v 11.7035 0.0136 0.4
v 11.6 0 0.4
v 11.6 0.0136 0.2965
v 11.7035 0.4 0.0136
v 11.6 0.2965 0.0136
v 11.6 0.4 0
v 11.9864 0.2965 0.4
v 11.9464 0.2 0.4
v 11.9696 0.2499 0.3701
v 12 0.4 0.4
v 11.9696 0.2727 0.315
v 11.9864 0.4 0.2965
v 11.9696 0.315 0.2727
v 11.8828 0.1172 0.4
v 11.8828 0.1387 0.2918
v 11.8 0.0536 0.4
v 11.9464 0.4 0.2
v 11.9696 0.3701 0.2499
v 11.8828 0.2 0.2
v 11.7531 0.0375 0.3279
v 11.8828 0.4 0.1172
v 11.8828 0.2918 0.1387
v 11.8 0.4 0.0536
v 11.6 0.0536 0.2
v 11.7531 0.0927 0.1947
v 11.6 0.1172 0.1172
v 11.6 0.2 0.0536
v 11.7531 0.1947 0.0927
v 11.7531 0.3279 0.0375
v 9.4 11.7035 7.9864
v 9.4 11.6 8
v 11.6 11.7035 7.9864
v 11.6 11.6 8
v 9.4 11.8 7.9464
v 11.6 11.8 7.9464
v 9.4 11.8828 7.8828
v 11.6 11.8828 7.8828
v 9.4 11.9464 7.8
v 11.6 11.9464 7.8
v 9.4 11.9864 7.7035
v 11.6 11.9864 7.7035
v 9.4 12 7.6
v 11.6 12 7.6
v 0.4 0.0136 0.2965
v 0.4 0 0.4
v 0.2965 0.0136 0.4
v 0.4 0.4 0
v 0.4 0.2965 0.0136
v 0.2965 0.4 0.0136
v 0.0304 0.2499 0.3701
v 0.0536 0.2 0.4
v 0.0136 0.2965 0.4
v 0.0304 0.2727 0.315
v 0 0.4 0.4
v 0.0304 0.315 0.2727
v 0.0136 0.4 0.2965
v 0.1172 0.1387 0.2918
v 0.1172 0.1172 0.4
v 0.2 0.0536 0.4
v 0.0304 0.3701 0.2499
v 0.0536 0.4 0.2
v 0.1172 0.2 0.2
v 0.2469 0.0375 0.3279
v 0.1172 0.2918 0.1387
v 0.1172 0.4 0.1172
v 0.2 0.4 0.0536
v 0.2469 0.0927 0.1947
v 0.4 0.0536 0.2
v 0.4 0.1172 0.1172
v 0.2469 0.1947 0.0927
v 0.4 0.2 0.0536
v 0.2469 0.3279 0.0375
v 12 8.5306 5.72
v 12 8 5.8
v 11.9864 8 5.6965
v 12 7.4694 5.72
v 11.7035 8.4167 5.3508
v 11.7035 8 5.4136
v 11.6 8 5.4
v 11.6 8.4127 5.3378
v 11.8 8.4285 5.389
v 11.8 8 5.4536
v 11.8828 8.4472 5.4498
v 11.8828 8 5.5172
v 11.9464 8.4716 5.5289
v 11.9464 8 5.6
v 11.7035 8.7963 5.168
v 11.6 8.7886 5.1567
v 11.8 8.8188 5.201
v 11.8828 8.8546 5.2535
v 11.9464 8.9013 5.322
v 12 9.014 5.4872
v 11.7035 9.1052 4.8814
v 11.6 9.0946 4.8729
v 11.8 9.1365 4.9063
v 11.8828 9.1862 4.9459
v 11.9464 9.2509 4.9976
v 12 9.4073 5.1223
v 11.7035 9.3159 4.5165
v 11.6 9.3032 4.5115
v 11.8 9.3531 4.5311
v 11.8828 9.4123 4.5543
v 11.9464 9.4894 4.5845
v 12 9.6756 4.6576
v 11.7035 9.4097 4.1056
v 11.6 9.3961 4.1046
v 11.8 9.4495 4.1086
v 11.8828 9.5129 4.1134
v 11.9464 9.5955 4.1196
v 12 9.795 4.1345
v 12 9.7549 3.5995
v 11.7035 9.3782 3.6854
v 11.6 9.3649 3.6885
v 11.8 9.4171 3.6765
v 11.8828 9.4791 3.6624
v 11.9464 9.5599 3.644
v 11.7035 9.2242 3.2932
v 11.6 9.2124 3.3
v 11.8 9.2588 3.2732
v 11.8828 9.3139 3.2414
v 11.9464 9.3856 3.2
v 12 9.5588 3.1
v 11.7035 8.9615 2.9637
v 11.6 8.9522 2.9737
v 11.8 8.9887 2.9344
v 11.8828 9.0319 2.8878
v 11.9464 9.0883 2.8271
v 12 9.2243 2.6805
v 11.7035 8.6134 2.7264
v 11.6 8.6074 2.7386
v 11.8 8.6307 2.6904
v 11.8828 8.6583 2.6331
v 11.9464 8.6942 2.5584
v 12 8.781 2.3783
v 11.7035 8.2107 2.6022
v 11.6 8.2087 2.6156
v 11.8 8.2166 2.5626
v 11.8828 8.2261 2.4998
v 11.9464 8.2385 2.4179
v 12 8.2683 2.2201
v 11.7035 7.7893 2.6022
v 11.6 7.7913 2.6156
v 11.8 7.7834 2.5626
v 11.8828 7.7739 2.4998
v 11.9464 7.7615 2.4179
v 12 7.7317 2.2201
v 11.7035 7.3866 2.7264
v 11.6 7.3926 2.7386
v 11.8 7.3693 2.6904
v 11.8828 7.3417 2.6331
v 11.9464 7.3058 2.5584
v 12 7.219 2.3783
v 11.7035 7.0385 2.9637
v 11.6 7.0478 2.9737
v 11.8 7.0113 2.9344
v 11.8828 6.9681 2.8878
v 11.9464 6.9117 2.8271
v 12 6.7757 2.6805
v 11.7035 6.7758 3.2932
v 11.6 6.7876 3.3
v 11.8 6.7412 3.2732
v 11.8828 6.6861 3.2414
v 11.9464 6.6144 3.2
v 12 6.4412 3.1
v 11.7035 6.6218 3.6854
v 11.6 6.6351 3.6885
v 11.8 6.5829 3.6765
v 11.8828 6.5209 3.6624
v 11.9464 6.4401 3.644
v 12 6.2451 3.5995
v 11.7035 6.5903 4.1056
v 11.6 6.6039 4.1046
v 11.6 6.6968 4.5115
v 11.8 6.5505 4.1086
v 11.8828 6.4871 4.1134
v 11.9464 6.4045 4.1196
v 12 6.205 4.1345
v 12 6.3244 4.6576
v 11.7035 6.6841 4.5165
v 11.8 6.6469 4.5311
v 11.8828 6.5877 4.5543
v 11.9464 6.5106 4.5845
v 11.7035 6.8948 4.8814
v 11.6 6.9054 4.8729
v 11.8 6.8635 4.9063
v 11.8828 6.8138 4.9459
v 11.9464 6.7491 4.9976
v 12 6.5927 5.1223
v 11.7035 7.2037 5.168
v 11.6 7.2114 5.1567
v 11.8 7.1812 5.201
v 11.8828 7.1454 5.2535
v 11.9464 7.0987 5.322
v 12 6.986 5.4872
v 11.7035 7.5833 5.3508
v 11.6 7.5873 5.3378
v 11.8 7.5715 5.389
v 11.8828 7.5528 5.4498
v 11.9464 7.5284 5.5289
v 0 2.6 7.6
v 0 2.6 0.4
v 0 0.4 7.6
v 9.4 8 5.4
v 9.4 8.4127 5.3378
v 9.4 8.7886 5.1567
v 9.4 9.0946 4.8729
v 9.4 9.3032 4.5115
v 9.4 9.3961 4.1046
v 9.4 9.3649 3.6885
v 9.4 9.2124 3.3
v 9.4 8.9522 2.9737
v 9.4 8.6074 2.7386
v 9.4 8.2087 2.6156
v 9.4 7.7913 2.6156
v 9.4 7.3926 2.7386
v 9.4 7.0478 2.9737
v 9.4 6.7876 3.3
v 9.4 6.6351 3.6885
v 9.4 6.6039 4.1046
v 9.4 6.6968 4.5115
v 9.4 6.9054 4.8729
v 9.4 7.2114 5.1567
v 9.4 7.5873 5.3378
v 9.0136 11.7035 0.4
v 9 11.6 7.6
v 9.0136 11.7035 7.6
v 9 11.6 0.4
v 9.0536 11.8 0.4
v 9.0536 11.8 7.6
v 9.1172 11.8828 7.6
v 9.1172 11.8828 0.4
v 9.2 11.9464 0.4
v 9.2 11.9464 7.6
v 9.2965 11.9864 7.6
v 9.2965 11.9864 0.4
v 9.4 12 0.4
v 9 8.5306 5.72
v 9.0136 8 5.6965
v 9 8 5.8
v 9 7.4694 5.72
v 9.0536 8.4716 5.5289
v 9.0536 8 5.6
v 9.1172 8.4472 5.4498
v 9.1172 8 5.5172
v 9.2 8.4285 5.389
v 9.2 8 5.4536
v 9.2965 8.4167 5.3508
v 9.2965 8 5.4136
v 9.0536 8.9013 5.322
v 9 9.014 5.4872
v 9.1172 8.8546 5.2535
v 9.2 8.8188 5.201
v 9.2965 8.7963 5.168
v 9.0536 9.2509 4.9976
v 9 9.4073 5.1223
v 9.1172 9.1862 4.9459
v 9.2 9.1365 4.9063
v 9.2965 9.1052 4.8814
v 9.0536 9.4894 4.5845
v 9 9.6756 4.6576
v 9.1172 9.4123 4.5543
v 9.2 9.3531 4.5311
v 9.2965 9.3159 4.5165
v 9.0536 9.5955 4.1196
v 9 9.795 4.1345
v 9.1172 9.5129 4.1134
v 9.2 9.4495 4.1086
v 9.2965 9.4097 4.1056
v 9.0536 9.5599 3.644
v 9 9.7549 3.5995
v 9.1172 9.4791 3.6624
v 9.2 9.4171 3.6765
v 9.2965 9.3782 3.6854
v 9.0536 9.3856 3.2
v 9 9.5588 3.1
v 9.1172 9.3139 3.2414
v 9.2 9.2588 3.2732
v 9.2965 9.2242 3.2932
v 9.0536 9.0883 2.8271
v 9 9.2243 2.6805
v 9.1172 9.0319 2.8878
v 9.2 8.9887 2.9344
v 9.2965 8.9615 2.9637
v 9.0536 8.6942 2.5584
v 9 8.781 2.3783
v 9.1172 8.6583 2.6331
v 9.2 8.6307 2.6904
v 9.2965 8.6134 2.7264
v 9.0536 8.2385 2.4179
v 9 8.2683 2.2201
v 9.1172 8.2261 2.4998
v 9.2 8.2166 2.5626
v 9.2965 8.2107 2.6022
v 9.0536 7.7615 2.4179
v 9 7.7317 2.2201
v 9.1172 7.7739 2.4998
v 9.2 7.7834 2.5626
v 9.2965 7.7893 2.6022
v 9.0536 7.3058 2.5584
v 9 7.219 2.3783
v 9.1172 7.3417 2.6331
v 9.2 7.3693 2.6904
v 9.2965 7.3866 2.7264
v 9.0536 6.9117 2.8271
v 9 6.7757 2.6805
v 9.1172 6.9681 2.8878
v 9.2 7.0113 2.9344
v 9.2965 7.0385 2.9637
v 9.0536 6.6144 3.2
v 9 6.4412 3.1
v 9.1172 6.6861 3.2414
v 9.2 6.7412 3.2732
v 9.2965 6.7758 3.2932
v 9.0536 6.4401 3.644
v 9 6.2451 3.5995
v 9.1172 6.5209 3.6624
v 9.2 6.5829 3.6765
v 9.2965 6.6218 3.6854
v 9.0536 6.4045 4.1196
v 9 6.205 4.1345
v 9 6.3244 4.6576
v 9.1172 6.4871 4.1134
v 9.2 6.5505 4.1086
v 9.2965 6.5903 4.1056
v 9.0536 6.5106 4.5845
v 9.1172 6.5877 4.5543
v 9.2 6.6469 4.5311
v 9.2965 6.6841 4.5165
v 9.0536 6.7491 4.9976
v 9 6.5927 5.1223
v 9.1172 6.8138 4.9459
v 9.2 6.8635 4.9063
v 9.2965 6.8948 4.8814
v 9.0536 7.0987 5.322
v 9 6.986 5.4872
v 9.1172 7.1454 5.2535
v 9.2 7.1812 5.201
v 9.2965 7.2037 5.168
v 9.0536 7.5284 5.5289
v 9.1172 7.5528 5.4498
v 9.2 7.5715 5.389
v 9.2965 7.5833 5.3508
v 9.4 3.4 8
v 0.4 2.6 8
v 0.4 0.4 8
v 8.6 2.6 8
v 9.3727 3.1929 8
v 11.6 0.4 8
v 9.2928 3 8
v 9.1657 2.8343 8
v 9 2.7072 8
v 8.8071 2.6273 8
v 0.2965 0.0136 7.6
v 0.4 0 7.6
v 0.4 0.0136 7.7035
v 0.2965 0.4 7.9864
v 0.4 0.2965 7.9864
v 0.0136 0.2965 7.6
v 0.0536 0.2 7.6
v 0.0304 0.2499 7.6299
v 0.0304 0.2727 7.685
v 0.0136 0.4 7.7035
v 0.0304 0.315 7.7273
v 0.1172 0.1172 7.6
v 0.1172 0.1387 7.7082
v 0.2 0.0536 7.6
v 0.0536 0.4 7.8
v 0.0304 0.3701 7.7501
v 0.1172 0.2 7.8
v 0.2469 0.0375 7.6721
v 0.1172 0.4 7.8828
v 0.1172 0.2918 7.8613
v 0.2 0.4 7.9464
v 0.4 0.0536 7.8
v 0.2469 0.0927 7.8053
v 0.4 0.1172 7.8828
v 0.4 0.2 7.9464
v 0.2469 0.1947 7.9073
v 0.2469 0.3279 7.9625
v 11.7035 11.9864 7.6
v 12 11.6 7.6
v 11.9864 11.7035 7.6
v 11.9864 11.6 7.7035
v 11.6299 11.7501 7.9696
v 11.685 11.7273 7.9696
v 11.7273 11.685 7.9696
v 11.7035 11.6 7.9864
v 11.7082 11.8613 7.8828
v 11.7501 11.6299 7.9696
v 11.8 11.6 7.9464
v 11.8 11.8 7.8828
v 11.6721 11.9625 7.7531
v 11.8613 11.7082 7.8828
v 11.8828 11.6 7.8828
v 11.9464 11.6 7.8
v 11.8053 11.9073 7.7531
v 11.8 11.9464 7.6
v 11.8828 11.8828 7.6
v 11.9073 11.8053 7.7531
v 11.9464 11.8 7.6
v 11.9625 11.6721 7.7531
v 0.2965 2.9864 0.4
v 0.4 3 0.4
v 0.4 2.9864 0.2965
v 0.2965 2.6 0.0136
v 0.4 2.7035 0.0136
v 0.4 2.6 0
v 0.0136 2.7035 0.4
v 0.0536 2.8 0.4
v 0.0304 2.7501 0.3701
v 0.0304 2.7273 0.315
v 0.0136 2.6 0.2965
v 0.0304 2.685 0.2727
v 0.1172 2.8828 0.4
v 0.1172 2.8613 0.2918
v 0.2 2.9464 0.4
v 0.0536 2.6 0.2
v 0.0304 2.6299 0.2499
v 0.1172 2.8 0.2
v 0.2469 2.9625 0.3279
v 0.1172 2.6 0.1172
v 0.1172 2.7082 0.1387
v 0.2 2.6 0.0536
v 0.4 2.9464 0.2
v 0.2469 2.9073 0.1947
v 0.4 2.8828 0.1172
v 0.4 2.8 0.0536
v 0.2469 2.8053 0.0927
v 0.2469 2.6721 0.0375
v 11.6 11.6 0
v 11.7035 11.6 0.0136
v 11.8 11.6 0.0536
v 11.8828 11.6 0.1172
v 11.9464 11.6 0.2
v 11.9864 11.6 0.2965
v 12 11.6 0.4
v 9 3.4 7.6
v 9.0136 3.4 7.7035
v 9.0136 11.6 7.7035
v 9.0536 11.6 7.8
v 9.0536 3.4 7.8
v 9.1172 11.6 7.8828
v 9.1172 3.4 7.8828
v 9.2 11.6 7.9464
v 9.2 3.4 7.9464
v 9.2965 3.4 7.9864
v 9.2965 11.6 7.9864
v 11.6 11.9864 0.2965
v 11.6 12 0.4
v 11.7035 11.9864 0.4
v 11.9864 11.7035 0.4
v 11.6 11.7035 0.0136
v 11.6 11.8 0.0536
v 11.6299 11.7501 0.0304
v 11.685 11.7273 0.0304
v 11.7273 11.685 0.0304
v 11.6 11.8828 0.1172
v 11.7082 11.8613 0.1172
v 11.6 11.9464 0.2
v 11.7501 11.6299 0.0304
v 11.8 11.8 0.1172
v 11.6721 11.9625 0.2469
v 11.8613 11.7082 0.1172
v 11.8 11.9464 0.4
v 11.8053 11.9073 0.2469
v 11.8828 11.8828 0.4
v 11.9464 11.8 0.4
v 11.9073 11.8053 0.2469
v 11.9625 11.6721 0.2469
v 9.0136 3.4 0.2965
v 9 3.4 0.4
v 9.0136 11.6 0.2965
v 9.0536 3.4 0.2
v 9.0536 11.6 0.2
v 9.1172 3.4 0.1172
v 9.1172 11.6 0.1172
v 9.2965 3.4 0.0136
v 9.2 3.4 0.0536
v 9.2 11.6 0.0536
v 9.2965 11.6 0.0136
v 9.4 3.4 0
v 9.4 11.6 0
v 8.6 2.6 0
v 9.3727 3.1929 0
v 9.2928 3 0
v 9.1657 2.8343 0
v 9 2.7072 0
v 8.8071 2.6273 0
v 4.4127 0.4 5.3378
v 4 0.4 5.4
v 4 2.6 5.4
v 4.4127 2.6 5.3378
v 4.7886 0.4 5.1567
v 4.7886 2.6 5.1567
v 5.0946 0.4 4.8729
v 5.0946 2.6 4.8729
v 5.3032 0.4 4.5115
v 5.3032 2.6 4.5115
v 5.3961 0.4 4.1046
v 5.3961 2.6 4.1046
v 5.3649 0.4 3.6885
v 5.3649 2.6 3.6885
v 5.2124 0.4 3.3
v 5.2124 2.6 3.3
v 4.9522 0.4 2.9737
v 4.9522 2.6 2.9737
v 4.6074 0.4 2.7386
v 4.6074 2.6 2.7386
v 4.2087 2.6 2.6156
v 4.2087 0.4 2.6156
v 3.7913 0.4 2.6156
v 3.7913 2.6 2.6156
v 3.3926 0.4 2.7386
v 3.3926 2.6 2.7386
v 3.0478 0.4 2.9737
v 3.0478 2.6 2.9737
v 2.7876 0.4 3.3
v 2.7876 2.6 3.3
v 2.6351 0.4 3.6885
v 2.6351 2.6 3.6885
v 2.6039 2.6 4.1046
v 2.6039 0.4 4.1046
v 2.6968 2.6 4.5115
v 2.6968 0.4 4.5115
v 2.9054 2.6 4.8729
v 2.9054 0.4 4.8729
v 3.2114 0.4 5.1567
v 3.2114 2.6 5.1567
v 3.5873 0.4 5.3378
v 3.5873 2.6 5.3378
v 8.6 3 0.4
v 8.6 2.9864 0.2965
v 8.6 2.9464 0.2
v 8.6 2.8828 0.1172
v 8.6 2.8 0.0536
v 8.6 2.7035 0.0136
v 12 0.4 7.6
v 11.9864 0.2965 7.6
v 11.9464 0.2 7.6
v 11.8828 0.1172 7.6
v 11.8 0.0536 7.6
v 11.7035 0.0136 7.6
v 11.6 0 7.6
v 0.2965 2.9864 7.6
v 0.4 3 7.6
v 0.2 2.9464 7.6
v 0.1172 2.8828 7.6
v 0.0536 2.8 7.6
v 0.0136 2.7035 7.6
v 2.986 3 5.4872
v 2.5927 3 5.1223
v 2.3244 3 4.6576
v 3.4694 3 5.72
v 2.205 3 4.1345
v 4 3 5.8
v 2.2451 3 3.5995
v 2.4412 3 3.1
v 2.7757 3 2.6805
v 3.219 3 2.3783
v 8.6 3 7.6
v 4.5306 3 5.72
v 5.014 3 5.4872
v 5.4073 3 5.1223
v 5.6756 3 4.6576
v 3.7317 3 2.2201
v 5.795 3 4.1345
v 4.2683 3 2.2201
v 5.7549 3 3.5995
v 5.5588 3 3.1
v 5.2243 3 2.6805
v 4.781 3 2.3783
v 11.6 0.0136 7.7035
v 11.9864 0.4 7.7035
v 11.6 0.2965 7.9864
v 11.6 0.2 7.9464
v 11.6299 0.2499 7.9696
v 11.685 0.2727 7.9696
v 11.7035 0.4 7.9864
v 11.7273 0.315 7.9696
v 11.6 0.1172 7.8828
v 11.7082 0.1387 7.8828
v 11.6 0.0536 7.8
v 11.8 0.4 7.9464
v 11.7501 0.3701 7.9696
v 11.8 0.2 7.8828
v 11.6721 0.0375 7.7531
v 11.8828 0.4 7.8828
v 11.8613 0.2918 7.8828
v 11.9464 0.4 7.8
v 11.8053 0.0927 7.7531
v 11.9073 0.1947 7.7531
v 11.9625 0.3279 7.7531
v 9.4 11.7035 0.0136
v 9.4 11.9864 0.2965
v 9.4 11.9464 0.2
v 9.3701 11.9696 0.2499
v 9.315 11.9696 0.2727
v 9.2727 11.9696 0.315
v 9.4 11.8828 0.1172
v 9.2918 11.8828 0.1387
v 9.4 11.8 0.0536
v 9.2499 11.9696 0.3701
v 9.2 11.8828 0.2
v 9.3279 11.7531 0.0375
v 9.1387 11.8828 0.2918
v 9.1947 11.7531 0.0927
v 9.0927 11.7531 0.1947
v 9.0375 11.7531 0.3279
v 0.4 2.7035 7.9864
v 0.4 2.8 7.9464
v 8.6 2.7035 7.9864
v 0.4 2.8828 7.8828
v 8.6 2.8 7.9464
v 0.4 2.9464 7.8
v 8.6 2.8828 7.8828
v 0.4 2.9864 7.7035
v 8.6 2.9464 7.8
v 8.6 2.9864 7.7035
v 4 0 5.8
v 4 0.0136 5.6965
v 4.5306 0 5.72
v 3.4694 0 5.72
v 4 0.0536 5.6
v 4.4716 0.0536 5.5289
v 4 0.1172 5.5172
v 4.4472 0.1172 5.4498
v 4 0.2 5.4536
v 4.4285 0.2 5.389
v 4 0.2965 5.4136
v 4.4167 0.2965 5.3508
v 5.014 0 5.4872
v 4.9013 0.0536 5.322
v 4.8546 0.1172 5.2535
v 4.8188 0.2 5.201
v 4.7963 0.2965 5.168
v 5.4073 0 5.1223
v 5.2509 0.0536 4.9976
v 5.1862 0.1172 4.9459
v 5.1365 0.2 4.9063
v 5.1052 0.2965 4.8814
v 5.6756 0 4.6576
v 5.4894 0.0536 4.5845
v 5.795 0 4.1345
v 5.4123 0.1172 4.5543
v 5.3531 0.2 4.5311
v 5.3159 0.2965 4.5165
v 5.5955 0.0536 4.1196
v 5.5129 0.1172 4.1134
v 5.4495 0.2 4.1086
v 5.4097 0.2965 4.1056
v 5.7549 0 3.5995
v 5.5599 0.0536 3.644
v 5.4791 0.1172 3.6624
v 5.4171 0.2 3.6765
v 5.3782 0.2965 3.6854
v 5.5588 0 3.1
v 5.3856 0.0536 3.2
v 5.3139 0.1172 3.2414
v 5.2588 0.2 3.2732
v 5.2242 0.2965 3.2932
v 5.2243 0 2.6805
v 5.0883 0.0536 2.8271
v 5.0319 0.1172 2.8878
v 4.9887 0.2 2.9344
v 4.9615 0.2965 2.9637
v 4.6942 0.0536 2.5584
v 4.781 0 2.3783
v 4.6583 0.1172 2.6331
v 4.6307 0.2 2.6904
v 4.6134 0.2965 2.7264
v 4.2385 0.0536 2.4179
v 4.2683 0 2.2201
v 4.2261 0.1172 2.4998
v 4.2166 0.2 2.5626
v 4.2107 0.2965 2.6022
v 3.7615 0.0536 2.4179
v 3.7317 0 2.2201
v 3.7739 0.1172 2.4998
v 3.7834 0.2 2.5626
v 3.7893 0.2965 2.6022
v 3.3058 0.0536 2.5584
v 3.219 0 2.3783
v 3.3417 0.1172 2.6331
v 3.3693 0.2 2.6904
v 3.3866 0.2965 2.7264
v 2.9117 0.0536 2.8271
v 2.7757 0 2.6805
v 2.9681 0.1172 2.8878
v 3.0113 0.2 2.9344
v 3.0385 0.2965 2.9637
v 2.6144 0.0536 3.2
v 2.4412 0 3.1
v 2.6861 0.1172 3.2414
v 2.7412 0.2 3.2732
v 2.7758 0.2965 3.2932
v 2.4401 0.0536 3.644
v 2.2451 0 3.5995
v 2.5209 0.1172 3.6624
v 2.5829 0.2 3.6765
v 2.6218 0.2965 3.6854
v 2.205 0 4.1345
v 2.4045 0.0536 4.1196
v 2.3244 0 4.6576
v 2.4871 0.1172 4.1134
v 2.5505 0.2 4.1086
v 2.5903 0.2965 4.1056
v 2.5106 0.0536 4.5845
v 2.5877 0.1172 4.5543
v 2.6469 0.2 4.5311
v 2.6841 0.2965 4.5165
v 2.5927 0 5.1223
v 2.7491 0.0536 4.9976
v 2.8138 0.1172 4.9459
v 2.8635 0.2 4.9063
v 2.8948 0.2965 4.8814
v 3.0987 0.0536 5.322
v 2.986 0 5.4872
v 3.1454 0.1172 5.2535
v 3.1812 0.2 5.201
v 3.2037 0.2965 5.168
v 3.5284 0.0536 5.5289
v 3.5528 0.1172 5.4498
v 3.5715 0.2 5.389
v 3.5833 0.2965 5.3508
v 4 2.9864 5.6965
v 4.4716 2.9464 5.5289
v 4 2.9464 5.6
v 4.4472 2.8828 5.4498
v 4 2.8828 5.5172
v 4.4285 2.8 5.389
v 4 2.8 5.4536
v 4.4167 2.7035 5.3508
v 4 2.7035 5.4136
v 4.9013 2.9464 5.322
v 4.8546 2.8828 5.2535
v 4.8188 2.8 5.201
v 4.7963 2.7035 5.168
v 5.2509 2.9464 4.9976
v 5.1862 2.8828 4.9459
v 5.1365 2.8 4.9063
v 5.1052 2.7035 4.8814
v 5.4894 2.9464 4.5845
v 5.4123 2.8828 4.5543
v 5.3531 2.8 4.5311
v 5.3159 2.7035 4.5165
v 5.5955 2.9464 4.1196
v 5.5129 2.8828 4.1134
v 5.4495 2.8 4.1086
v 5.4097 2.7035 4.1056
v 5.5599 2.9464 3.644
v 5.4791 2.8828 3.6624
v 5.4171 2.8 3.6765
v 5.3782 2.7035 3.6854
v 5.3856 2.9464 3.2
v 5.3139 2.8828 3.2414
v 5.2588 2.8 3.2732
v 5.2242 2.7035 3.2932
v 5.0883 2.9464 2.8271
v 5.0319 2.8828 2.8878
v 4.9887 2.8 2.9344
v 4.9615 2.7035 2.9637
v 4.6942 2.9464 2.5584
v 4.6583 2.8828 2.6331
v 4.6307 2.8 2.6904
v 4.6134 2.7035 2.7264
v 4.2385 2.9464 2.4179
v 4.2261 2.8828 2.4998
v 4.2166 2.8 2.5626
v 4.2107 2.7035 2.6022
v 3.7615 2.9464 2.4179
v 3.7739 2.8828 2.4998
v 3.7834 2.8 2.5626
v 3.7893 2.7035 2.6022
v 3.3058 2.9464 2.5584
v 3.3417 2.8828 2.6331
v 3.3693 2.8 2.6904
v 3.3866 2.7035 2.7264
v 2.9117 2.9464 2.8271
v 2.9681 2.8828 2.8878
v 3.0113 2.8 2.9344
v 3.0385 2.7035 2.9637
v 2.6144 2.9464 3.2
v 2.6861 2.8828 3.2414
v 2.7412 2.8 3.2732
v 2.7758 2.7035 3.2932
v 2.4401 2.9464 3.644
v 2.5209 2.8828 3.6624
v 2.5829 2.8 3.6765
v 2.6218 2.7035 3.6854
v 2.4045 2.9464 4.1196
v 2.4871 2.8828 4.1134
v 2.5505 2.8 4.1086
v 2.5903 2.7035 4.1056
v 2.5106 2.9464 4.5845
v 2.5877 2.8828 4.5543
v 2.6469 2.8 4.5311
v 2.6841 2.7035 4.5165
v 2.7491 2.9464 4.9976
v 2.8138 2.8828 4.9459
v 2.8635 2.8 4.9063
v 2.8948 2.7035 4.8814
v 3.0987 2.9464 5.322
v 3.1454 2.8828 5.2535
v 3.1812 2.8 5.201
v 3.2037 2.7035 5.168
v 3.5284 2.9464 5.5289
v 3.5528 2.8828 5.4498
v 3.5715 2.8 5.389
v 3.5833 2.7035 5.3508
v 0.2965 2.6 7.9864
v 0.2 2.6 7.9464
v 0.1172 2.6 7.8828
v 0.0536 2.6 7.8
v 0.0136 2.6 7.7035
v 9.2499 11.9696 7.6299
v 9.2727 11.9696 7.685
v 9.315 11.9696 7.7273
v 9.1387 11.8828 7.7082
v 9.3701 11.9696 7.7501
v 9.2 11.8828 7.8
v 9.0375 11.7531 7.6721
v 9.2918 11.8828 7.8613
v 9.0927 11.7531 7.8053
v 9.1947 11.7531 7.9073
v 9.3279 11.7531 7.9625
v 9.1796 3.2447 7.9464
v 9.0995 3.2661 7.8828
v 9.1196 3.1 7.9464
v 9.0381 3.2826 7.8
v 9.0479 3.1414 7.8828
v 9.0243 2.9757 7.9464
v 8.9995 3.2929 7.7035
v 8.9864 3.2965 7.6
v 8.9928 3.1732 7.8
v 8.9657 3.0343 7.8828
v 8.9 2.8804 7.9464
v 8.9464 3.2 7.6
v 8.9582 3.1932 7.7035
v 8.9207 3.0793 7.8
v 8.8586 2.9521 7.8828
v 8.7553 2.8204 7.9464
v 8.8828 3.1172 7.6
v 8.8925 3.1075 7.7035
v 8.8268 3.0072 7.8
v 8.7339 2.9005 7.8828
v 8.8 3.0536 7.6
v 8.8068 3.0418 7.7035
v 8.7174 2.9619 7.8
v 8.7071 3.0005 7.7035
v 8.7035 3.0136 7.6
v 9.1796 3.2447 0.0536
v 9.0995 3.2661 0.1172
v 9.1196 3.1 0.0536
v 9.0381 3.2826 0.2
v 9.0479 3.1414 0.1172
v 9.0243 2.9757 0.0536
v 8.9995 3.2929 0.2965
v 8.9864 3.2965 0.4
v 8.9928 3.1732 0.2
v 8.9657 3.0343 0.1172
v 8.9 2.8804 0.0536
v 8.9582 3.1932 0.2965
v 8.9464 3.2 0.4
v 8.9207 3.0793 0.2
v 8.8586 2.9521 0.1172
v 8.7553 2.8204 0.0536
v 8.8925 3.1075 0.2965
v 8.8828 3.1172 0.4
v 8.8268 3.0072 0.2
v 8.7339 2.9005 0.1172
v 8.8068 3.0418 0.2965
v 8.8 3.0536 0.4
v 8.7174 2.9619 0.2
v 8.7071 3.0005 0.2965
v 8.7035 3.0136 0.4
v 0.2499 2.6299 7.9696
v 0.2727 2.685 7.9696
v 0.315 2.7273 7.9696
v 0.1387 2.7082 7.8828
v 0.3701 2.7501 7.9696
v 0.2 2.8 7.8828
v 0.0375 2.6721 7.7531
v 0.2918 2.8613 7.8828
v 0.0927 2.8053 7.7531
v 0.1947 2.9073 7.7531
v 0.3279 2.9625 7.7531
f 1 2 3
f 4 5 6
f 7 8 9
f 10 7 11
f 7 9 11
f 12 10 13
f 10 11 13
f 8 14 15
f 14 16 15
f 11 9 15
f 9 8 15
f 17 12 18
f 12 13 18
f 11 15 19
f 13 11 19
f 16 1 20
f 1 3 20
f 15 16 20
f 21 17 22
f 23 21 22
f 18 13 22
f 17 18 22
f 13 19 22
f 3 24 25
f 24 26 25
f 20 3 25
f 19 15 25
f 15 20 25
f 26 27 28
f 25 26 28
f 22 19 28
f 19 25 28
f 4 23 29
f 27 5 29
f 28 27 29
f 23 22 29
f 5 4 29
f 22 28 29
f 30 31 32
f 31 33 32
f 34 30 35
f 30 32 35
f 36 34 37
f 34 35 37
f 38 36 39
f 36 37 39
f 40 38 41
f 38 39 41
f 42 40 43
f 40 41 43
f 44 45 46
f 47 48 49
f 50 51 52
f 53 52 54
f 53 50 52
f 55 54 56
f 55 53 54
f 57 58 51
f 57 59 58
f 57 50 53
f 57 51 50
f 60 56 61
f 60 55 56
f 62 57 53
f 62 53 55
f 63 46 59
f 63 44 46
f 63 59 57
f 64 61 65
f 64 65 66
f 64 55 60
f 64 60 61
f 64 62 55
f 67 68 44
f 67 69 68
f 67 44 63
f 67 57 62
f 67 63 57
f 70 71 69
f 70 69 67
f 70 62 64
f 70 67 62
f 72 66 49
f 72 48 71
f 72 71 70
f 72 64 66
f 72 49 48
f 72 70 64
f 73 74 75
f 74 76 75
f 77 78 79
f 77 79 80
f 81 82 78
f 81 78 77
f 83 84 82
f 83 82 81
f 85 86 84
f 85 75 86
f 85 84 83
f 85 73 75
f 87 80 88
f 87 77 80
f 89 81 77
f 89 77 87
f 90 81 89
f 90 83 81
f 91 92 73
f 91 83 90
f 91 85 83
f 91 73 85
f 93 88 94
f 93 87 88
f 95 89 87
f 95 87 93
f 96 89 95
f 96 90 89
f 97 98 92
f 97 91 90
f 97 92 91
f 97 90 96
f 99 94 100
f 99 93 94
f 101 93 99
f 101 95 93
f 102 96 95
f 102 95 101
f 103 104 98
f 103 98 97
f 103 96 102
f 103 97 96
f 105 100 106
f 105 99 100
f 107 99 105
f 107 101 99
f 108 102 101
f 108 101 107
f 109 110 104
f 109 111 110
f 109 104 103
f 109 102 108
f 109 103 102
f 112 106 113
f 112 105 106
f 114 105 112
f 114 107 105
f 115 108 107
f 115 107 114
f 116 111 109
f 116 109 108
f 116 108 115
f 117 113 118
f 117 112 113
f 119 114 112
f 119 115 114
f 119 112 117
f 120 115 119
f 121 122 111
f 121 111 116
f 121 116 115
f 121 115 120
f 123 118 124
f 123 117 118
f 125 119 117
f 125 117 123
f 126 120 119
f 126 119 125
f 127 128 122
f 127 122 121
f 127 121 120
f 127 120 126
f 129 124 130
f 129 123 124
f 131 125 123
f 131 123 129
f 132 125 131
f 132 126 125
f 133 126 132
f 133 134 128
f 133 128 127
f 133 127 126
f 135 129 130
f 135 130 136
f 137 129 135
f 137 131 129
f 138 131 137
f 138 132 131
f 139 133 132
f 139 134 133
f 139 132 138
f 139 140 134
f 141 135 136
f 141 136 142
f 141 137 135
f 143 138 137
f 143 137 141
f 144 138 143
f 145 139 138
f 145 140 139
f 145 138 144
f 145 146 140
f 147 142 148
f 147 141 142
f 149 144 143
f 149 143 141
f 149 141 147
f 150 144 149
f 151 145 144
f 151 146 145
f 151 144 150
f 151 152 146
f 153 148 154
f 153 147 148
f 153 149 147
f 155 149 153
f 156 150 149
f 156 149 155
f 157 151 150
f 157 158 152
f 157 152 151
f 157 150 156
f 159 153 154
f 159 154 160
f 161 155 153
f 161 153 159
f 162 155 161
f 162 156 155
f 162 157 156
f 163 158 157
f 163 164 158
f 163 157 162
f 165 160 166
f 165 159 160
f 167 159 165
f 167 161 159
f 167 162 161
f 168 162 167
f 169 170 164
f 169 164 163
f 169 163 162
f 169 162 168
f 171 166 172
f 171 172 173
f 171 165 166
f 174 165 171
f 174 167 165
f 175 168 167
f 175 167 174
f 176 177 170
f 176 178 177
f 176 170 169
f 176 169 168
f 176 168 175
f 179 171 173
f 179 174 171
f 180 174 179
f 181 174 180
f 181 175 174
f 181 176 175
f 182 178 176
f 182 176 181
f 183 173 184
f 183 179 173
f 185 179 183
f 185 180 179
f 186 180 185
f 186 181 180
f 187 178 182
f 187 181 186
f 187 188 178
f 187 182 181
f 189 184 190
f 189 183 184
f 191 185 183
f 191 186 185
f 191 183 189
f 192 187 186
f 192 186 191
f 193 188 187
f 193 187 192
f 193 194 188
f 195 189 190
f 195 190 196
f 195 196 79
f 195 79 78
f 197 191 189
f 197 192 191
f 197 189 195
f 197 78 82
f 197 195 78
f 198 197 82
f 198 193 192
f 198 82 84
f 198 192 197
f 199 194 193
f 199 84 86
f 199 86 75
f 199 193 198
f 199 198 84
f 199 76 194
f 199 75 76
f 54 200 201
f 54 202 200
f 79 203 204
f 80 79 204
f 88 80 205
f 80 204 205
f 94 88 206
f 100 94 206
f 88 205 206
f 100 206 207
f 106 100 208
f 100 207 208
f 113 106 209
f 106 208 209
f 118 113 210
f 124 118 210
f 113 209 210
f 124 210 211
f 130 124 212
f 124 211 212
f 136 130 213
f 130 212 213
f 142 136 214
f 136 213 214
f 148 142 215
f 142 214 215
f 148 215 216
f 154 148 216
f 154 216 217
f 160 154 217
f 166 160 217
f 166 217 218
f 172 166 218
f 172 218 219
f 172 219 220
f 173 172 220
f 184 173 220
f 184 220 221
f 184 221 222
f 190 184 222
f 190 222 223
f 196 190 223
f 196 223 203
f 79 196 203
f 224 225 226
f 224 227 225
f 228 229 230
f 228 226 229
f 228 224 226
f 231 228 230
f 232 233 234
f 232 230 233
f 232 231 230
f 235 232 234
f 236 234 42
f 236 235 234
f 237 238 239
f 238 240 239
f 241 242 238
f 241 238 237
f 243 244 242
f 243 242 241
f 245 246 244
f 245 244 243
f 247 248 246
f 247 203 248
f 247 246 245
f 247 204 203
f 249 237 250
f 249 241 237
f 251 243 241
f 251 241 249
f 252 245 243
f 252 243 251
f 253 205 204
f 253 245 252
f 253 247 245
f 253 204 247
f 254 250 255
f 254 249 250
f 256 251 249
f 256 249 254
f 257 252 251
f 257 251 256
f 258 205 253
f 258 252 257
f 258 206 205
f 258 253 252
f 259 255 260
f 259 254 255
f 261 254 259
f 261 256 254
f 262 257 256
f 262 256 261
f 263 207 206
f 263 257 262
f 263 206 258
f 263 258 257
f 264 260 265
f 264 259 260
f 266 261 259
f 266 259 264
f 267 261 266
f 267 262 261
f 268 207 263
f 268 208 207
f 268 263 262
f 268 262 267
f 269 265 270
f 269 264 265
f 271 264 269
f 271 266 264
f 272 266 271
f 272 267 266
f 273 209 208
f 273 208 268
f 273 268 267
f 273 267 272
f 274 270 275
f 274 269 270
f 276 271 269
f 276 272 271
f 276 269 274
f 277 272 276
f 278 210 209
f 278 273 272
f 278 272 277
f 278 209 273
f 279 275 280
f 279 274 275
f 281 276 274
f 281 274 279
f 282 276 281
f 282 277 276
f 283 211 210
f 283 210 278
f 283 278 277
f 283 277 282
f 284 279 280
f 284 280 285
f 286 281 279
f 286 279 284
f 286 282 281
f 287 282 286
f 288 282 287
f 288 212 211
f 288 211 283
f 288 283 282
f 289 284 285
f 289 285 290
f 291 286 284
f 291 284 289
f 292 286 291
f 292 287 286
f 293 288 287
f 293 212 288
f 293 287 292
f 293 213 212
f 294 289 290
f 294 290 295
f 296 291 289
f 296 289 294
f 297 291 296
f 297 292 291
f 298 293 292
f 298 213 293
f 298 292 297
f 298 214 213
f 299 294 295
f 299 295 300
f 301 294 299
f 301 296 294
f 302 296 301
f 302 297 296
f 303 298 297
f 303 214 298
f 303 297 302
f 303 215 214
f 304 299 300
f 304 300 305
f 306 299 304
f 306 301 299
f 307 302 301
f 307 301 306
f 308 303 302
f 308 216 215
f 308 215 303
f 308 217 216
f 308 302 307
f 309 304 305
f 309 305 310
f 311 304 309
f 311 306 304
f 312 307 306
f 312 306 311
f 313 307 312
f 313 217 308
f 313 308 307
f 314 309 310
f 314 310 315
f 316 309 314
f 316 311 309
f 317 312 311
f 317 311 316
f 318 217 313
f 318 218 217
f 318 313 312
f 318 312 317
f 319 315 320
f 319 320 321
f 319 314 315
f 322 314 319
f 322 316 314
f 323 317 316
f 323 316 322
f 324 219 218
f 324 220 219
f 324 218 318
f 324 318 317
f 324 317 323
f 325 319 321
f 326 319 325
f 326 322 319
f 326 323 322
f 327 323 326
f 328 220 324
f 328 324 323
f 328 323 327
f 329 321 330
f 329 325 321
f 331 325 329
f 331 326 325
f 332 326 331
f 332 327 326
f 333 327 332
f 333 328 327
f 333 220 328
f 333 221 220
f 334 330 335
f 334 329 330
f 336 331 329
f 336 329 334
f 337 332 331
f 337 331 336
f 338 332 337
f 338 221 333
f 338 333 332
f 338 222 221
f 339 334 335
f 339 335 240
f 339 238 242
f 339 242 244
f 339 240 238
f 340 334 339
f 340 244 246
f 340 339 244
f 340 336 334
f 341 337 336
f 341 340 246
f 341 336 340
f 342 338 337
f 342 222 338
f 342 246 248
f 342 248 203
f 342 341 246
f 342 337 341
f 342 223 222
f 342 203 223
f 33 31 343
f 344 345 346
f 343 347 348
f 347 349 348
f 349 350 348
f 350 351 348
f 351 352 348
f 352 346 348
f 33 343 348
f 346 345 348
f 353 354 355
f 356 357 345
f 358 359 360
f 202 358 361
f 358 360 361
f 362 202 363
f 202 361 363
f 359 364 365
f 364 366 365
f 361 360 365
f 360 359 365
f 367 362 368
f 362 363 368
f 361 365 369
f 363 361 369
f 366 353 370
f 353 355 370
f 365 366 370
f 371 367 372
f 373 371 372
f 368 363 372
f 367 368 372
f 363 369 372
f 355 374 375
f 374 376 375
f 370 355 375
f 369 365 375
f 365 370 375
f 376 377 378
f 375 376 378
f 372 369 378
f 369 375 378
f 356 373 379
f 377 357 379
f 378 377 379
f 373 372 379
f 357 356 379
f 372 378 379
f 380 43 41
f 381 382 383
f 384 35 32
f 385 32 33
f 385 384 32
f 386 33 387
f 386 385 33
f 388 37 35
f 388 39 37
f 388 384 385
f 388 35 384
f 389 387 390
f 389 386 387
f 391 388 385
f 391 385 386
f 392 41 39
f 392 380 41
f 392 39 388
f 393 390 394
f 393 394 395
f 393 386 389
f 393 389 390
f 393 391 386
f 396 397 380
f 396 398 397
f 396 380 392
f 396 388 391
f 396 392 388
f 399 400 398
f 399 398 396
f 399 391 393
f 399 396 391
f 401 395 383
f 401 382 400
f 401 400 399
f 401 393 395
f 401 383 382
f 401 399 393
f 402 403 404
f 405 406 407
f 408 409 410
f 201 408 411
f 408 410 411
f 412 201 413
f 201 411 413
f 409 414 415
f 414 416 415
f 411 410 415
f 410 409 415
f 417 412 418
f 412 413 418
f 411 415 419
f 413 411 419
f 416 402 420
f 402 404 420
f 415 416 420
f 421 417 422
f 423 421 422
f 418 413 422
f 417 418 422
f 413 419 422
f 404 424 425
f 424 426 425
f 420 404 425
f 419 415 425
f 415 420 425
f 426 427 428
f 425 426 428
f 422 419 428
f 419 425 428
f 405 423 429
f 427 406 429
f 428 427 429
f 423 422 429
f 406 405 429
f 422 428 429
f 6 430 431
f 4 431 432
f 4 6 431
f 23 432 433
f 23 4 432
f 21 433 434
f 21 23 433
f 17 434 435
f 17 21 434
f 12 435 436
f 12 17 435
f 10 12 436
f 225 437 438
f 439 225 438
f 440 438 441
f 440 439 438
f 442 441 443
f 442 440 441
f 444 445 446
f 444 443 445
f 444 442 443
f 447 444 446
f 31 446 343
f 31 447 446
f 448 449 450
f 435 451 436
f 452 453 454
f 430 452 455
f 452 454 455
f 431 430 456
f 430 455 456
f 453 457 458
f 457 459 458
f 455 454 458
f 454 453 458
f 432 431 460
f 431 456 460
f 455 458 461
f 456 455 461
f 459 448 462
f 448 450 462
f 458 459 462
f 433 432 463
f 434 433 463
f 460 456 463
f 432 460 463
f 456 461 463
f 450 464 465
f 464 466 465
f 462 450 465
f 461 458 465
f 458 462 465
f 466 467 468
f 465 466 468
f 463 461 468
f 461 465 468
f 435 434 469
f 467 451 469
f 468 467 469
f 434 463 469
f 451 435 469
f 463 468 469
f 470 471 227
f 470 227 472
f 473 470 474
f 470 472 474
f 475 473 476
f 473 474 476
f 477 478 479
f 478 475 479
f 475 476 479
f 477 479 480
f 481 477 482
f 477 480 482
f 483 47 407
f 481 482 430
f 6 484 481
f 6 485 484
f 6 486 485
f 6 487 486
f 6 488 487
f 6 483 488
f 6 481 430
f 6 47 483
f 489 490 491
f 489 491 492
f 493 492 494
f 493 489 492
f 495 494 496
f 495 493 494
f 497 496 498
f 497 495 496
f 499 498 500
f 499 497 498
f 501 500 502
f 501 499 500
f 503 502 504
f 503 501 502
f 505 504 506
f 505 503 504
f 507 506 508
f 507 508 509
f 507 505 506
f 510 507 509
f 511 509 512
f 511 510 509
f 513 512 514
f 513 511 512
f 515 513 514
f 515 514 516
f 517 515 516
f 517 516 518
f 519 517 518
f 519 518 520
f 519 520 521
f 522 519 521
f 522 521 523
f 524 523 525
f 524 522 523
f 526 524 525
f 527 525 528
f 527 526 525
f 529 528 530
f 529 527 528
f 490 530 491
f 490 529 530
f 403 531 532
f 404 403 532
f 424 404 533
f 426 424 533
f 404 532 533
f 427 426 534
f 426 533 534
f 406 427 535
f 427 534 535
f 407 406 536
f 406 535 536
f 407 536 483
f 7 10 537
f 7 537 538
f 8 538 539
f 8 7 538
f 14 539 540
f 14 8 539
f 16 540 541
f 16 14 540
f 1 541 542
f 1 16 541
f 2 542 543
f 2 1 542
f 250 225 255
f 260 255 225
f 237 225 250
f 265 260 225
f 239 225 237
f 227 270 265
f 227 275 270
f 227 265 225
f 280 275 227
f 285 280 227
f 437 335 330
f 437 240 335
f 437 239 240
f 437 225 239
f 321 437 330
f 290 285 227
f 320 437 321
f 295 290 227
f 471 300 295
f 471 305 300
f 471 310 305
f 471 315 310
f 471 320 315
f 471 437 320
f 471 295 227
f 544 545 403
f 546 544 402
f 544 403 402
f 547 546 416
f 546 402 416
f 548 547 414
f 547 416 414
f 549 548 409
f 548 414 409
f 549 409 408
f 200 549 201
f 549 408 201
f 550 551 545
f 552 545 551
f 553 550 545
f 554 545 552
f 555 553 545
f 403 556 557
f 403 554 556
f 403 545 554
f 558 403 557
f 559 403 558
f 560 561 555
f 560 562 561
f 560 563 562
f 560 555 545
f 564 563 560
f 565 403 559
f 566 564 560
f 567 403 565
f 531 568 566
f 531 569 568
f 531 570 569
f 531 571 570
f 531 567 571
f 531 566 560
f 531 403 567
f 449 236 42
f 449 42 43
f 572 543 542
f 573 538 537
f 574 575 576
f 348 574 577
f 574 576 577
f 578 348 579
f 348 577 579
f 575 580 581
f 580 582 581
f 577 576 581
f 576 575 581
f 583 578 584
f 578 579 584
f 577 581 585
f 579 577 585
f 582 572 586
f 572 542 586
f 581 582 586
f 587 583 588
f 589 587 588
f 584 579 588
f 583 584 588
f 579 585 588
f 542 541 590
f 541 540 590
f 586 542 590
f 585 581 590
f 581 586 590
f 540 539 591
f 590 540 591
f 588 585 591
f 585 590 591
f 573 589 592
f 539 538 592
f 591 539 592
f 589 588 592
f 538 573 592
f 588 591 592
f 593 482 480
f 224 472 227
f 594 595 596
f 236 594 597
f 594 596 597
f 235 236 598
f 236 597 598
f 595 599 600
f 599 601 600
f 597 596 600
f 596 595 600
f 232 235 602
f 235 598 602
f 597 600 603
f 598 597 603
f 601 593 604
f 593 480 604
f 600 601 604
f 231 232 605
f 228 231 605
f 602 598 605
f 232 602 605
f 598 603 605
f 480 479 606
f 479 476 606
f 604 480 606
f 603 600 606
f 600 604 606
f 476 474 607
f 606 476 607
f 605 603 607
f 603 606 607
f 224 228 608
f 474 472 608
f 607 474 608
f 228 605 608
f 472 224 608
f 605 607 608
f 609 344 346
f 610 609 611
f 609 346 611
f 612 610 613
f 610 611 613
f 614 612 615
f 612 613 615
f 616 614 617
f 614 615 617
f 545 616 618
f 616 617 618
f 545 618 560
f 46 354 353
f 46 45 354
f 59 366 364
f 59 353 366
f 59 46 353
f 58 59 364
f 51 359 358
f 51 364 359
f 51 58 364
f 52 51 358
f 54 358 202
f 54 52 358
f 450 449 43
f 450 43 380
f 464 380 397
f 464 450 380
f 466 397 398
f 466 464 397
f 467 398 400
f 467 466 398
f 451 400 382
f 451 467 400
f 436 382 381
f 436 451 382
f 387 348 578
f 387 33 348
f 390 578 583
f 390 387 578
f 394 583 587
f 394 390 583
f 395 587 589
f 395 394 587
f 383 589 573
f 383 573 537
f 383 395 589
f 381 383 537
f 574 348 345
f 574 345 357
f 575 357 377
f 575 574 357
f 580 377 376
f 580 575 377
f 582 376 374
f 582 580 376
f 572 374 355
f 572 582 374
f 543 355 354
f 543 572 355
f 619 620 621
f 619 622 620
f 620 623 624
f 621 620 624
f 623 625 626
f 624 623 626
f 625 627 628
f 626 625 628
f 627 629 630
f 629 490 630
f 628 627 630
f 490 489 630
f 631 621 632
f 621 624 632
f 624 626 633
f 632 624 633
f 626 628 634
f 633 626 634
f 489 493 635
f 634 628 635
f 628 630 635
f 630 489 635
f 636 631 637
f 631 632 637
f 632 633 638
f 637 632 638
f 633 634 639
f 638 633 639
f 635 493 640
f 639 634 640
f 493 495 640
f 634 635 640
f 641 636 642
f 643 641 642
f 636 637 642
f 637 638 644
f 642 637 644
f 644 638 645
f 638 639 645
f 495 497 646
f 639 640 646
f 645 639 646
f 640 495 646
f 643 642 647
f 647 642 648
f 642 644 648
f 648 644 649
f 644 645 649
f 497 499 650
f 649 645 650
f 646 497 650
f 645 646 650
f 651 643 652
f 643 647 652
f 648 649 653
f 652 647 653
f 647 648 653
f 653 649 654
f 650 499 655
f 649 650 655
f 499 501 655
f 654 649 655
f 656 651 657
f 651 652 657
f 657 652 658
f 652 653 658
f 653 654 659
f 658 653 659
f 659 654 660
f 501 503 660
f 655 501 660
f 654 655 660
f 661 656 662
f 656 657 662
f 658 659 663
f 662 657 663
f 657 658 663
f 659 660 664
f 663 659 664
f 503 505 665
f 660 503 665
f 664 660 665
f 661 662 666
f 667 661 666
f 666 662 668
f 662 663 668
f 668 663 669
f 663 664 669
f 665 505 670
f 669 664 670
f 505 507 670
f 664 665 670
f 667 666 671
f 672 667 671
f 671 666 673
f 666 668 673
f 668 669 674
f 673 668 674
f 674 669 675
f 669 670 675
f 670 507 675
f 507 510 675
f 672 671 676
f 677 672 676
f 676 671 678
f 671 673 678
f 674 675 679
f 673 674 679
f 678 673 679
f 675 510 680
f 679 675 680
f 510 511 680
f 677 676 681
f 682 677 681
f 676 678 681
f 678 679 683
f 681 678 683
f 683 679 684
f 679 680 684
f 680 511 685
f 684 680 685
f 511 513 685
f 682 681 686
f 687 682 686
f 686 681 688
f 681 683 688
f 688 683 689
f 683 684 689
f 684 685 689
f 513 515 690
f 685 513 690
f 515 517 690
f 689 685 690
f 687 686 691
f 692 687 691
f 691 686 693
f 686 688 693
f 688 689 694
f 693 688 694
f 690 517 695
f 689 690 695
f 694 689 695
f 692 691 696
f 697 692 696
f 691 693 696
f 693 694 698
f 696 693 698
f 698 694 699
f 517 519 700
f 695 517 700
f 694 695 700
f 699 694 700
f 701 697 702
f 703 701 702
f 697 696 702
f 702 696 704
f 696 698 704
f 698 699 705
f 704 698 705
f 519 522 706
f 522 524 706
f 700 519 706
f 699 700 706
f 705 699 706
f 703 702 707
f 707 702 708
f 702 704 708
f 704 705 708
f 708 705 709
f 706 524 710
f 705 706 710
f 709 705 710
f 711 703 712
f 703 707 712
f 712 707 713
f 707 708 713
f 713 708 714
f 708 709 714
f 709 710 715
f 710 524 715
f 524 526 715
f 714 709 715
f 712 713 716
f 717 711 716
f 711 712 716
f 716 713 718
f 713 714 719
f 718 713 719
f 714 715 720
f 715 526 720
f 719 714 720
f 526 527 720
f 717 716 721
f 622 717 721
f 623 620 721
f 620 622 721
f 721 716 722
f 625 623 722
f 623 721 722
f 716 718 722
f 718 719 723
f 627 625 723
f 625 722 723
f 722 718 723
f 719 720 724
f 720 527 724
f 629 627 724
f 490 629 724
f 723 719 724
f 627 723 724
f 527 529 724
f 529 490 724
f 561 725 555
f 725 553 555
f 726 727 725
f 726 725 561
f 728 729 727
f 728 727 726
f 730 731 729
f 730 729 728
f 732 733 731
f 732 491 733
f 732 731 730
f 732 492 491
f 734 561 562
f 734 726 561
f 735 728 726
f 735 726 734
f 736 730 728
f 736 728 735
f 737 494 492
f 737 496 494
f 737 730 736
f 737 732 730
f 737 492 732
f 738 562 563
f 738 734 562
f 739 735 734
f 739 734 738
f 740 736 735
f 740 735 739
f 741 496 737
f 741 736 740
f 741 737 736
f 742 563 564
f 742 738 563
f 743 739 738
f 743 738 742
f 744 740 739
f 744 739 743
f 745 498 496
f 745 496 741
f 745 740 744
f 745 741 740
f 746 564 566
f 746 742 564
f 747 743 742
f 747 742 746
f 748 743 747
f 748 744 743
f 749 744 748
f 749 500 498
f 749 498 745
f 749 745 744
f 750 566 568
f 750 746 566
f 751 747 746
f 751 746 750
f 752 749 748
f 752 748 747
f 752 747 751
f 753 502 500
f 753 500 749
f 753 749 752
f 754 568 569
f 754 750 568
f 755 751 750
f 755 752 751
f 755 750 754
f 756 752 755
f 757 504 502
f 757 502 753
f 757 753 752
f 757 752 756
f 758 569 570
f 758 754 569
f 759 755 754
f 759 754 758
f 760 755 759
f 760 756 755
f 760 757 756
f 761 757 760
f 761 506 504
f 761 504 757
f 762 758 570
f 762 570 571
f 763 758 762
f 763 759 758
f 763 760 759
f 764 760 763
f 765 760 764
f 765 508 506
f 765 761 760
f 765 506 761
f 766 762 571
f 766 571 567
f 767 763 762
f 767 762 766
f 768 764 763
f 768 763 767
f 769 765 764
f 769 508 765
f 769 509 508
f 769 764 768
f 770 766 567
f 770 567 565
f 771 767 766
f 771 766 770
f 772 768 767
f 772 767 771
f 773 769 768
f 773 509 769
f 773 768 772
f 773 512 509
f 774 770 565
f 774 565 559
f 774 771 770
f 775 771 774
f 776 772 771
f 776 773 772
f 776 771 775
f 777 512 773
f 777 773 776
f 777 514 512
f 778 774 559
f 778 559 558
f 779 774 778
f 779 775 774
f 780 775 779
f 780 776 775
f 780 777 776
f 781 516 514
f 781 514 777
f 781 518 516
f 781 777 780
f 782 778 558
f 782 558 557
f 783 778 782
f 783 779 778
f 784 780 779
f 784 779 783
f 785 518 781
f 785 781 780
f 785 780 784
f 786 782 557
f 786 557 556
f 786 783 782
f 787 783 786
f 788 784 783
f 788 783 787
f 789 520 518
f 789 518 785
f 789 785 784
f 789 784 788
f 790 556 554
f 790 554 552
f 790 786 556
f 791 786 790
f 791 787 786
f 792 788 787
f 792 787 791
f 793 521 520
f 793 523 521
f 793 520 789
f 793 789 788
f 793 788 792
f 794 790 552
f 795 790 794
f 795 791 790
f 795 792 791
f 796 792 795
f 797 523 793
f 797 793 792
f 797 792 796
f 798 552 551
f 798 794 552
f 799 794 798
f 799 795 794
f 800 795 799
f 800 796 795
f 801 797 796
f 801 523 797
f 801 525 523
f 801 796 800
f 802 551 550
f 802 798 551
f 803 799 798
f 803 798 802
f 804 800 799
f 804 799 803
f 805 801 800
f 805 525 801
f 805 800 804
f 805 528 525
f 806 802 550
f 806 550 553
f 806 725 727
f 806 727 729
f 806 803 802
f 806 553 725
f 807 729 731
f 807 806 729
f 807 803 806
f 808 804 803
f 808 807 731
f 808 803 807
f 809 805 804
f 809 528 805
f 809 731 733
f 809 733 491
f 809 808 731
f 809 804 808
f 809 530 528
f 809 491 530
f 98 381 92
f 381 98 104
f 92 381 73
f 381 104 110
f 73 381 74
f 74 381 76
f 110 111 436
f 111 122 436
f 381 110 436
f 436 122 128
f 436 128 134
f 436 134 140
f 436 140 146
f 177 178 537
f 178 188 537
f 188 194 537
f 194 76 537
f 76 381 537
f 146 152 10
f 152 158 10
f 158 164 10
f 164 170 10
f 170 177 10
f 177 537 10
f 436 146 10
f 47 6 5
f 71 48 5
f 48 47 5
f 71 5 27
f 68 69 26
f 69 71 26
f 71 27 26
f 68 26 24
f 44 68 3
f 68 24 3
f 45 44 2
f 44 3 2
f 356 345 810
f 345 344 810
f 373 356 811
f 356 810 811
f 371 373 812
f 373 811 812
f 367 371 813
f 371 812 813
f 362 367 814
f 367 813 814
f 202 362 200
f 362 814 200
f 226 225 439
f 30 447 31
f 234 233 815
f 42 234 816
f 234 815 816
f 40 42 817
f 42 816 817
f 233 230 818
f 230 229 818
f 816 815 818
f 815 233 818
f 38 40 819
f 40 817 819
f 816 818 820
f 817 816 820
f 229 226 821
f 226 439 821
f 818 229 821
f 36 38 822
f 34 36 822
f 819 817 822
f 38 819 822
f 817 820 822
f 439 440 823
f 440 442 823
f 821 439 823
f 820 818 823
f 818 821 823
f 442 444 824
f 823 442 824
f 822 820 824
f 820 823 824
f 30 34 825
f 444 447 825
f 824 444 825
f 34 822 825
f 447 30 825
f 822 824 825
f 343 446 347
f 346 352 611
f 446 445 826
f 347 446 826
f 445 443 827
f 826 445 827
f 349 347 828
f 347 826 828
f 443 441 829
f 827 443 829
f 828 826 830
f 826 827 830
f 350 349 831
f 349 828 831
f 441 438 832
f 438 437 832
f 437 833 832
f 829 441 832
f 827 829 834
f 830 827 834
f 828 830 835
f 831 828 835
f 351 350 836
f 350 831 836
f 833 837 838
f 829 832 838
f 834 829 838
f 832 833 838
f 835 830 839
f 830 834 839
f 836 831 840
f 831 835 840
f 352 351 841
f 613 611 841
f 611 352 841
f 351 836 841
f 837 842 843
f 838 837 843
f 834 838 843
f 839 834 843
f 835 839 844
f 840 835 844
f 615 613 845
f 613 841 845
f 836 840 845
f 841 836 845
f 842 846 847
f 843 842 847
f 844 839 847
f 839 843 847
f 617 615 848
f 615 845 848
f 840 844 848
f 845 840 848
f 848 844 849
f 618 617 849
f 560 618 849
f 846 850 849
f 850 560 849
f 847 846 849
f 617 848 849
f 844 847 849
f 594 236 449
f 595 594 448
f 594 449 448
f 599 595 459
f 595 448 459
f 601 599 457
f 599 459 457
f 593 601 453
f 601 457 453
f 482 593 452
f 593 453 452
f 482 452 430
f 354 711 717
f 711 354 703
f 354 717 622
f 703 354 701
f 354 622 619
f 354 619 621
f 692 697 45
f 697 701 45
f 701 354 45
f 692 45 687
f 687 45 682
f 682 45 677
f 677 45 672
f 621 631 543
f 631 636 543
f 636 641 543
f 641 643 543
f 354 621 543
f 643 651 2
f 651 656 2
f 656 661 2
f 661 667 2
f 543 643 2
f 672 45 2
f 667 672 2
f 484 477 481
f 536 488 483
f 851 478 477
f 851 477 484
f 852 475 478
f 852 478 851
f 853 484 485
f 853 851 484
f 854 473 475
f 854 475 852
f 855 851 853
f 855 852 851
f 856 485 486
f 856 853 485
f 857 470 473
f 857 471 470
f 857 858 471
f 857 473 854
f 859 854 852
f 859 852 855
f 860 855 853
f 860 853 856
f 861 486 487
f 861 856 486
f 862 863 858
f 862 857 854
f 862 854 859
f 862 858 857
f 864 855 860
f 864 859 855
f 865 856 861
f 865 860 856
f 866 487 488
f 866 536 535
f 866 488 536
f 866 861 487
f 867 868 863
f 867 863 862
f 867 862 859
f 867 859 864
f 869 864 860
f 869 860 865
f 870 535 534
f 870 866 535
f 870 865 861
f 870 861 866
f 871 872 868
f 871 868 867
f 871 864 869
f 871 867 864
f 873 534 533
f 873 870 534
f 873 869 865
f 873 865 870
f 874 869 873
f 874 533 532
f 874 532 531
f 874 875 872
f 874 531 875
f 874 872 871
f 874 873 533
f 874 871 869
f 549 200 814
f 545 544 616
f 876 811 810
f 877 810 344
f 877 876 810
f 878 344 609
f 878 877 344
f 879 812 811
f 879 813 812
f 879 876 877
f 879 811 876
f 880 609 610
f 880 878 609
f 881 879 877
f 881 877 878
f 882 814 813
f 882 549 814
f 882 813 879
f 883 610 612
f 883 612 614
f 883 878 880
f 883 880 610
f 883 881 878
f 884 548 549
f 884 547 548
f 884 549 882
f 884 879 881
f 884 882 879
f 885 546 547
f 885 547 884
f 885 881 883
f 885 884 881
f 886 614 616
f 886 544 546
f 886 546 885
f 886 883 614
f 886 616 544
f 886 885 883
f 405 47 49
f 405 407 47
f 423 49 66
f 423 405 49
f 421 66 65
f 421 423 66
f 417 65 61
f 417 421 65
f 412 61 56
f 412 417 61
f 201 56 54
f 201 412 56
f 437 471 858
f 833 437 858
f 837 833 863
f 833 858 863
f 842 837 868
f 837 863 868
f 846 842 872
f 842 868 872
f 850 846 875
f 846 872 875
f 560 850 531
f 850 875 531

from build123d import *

# Parameters (mm, degrees)
SKETCH1_W           = 12
SKETCH1_H           = 8
SKETCH1_R           = 1.4
BOSS_EXTRUDE1_DEPTH = 3
SKETCH2_W           = 3
SKETCH2_H           = 8
BOSS_EXTRUDE2_DEPTH = 9
SKETCH3_R           = 1.4
CUT_EXTRUDE1_DEPTH  = 10
FILLET1_R           = 0.4


with BuildPart() as part:
    # Sketch1 → Boss-Extrude1 (new body)
    with BuildSketch(Plane(origin=(0, 0, 0), x_dir=(1, 0, 0), z_dir=(0, 1, 0))):
        with Locations((6, -4)):
            Rectangle(SKETCH1_W, SKETCH1_H)
        with Locations(Location((4, -4, 0), (0, 0, 270))):
            Circle(SKETCH1_R, mode=Mode.SUBTRACT)
    extrude(amount=BOSS_EXTRUDE1_DEPTH)

    # Sketch2 → Boss-Extrude2 (add)
    with BuildSketch(Plane(origin=(0, 3, 0), x_dir=(1, 0, 0), z_dir=(0, 1, 0))):
        with Locations((10.5, -4)):
            Rectangle(SKETCH2_W, SKETCH2_H)
    extrude(amount=BOSS_EXTRUDE2_DEPTH)

    # Sketch3 → Cut-Extrude1 (cut)
    with BuildSketch(Plane.ZY.offset(-9)):
        with Locations((4, 8)):
            Circle(SKETCH3_R)
    extrude(amount=-CUT_EXTRUDE1_DEPTH, mode=Mode.SUBTRACT)

    # Fillet1
    fillet1_edges = [part.edges().sort_by_distance(p)[0] for p in [
        (4, 0, 2.6),
        (4, 3, 2.6),
        (4.5, 3, 0),
        (9, 3, 4),
        (9, 7.5, 0),
        (9, 7.5, 8),
        (12, 12, 4),
        (10.5, 12, 0),
        (9, 12, 4),
        (10.5, 12, 8),
        (12, 8, 2.6),
        (9, 8, 2.6),
        (0, 3, 4),
        (6, 0, 0),
        (12, 0, 4),
        (6, 0, 8),
        (0, 0, 4),
        (0, 1.5, 0),
        (12, 6, 0),
        (12, 6, 8),
        (0, 1.5, 8),
        (4.5, 3, 8),
    ]]
    fillet(fillet1_edges, radius=FILLET1_R)


solid = part.part
